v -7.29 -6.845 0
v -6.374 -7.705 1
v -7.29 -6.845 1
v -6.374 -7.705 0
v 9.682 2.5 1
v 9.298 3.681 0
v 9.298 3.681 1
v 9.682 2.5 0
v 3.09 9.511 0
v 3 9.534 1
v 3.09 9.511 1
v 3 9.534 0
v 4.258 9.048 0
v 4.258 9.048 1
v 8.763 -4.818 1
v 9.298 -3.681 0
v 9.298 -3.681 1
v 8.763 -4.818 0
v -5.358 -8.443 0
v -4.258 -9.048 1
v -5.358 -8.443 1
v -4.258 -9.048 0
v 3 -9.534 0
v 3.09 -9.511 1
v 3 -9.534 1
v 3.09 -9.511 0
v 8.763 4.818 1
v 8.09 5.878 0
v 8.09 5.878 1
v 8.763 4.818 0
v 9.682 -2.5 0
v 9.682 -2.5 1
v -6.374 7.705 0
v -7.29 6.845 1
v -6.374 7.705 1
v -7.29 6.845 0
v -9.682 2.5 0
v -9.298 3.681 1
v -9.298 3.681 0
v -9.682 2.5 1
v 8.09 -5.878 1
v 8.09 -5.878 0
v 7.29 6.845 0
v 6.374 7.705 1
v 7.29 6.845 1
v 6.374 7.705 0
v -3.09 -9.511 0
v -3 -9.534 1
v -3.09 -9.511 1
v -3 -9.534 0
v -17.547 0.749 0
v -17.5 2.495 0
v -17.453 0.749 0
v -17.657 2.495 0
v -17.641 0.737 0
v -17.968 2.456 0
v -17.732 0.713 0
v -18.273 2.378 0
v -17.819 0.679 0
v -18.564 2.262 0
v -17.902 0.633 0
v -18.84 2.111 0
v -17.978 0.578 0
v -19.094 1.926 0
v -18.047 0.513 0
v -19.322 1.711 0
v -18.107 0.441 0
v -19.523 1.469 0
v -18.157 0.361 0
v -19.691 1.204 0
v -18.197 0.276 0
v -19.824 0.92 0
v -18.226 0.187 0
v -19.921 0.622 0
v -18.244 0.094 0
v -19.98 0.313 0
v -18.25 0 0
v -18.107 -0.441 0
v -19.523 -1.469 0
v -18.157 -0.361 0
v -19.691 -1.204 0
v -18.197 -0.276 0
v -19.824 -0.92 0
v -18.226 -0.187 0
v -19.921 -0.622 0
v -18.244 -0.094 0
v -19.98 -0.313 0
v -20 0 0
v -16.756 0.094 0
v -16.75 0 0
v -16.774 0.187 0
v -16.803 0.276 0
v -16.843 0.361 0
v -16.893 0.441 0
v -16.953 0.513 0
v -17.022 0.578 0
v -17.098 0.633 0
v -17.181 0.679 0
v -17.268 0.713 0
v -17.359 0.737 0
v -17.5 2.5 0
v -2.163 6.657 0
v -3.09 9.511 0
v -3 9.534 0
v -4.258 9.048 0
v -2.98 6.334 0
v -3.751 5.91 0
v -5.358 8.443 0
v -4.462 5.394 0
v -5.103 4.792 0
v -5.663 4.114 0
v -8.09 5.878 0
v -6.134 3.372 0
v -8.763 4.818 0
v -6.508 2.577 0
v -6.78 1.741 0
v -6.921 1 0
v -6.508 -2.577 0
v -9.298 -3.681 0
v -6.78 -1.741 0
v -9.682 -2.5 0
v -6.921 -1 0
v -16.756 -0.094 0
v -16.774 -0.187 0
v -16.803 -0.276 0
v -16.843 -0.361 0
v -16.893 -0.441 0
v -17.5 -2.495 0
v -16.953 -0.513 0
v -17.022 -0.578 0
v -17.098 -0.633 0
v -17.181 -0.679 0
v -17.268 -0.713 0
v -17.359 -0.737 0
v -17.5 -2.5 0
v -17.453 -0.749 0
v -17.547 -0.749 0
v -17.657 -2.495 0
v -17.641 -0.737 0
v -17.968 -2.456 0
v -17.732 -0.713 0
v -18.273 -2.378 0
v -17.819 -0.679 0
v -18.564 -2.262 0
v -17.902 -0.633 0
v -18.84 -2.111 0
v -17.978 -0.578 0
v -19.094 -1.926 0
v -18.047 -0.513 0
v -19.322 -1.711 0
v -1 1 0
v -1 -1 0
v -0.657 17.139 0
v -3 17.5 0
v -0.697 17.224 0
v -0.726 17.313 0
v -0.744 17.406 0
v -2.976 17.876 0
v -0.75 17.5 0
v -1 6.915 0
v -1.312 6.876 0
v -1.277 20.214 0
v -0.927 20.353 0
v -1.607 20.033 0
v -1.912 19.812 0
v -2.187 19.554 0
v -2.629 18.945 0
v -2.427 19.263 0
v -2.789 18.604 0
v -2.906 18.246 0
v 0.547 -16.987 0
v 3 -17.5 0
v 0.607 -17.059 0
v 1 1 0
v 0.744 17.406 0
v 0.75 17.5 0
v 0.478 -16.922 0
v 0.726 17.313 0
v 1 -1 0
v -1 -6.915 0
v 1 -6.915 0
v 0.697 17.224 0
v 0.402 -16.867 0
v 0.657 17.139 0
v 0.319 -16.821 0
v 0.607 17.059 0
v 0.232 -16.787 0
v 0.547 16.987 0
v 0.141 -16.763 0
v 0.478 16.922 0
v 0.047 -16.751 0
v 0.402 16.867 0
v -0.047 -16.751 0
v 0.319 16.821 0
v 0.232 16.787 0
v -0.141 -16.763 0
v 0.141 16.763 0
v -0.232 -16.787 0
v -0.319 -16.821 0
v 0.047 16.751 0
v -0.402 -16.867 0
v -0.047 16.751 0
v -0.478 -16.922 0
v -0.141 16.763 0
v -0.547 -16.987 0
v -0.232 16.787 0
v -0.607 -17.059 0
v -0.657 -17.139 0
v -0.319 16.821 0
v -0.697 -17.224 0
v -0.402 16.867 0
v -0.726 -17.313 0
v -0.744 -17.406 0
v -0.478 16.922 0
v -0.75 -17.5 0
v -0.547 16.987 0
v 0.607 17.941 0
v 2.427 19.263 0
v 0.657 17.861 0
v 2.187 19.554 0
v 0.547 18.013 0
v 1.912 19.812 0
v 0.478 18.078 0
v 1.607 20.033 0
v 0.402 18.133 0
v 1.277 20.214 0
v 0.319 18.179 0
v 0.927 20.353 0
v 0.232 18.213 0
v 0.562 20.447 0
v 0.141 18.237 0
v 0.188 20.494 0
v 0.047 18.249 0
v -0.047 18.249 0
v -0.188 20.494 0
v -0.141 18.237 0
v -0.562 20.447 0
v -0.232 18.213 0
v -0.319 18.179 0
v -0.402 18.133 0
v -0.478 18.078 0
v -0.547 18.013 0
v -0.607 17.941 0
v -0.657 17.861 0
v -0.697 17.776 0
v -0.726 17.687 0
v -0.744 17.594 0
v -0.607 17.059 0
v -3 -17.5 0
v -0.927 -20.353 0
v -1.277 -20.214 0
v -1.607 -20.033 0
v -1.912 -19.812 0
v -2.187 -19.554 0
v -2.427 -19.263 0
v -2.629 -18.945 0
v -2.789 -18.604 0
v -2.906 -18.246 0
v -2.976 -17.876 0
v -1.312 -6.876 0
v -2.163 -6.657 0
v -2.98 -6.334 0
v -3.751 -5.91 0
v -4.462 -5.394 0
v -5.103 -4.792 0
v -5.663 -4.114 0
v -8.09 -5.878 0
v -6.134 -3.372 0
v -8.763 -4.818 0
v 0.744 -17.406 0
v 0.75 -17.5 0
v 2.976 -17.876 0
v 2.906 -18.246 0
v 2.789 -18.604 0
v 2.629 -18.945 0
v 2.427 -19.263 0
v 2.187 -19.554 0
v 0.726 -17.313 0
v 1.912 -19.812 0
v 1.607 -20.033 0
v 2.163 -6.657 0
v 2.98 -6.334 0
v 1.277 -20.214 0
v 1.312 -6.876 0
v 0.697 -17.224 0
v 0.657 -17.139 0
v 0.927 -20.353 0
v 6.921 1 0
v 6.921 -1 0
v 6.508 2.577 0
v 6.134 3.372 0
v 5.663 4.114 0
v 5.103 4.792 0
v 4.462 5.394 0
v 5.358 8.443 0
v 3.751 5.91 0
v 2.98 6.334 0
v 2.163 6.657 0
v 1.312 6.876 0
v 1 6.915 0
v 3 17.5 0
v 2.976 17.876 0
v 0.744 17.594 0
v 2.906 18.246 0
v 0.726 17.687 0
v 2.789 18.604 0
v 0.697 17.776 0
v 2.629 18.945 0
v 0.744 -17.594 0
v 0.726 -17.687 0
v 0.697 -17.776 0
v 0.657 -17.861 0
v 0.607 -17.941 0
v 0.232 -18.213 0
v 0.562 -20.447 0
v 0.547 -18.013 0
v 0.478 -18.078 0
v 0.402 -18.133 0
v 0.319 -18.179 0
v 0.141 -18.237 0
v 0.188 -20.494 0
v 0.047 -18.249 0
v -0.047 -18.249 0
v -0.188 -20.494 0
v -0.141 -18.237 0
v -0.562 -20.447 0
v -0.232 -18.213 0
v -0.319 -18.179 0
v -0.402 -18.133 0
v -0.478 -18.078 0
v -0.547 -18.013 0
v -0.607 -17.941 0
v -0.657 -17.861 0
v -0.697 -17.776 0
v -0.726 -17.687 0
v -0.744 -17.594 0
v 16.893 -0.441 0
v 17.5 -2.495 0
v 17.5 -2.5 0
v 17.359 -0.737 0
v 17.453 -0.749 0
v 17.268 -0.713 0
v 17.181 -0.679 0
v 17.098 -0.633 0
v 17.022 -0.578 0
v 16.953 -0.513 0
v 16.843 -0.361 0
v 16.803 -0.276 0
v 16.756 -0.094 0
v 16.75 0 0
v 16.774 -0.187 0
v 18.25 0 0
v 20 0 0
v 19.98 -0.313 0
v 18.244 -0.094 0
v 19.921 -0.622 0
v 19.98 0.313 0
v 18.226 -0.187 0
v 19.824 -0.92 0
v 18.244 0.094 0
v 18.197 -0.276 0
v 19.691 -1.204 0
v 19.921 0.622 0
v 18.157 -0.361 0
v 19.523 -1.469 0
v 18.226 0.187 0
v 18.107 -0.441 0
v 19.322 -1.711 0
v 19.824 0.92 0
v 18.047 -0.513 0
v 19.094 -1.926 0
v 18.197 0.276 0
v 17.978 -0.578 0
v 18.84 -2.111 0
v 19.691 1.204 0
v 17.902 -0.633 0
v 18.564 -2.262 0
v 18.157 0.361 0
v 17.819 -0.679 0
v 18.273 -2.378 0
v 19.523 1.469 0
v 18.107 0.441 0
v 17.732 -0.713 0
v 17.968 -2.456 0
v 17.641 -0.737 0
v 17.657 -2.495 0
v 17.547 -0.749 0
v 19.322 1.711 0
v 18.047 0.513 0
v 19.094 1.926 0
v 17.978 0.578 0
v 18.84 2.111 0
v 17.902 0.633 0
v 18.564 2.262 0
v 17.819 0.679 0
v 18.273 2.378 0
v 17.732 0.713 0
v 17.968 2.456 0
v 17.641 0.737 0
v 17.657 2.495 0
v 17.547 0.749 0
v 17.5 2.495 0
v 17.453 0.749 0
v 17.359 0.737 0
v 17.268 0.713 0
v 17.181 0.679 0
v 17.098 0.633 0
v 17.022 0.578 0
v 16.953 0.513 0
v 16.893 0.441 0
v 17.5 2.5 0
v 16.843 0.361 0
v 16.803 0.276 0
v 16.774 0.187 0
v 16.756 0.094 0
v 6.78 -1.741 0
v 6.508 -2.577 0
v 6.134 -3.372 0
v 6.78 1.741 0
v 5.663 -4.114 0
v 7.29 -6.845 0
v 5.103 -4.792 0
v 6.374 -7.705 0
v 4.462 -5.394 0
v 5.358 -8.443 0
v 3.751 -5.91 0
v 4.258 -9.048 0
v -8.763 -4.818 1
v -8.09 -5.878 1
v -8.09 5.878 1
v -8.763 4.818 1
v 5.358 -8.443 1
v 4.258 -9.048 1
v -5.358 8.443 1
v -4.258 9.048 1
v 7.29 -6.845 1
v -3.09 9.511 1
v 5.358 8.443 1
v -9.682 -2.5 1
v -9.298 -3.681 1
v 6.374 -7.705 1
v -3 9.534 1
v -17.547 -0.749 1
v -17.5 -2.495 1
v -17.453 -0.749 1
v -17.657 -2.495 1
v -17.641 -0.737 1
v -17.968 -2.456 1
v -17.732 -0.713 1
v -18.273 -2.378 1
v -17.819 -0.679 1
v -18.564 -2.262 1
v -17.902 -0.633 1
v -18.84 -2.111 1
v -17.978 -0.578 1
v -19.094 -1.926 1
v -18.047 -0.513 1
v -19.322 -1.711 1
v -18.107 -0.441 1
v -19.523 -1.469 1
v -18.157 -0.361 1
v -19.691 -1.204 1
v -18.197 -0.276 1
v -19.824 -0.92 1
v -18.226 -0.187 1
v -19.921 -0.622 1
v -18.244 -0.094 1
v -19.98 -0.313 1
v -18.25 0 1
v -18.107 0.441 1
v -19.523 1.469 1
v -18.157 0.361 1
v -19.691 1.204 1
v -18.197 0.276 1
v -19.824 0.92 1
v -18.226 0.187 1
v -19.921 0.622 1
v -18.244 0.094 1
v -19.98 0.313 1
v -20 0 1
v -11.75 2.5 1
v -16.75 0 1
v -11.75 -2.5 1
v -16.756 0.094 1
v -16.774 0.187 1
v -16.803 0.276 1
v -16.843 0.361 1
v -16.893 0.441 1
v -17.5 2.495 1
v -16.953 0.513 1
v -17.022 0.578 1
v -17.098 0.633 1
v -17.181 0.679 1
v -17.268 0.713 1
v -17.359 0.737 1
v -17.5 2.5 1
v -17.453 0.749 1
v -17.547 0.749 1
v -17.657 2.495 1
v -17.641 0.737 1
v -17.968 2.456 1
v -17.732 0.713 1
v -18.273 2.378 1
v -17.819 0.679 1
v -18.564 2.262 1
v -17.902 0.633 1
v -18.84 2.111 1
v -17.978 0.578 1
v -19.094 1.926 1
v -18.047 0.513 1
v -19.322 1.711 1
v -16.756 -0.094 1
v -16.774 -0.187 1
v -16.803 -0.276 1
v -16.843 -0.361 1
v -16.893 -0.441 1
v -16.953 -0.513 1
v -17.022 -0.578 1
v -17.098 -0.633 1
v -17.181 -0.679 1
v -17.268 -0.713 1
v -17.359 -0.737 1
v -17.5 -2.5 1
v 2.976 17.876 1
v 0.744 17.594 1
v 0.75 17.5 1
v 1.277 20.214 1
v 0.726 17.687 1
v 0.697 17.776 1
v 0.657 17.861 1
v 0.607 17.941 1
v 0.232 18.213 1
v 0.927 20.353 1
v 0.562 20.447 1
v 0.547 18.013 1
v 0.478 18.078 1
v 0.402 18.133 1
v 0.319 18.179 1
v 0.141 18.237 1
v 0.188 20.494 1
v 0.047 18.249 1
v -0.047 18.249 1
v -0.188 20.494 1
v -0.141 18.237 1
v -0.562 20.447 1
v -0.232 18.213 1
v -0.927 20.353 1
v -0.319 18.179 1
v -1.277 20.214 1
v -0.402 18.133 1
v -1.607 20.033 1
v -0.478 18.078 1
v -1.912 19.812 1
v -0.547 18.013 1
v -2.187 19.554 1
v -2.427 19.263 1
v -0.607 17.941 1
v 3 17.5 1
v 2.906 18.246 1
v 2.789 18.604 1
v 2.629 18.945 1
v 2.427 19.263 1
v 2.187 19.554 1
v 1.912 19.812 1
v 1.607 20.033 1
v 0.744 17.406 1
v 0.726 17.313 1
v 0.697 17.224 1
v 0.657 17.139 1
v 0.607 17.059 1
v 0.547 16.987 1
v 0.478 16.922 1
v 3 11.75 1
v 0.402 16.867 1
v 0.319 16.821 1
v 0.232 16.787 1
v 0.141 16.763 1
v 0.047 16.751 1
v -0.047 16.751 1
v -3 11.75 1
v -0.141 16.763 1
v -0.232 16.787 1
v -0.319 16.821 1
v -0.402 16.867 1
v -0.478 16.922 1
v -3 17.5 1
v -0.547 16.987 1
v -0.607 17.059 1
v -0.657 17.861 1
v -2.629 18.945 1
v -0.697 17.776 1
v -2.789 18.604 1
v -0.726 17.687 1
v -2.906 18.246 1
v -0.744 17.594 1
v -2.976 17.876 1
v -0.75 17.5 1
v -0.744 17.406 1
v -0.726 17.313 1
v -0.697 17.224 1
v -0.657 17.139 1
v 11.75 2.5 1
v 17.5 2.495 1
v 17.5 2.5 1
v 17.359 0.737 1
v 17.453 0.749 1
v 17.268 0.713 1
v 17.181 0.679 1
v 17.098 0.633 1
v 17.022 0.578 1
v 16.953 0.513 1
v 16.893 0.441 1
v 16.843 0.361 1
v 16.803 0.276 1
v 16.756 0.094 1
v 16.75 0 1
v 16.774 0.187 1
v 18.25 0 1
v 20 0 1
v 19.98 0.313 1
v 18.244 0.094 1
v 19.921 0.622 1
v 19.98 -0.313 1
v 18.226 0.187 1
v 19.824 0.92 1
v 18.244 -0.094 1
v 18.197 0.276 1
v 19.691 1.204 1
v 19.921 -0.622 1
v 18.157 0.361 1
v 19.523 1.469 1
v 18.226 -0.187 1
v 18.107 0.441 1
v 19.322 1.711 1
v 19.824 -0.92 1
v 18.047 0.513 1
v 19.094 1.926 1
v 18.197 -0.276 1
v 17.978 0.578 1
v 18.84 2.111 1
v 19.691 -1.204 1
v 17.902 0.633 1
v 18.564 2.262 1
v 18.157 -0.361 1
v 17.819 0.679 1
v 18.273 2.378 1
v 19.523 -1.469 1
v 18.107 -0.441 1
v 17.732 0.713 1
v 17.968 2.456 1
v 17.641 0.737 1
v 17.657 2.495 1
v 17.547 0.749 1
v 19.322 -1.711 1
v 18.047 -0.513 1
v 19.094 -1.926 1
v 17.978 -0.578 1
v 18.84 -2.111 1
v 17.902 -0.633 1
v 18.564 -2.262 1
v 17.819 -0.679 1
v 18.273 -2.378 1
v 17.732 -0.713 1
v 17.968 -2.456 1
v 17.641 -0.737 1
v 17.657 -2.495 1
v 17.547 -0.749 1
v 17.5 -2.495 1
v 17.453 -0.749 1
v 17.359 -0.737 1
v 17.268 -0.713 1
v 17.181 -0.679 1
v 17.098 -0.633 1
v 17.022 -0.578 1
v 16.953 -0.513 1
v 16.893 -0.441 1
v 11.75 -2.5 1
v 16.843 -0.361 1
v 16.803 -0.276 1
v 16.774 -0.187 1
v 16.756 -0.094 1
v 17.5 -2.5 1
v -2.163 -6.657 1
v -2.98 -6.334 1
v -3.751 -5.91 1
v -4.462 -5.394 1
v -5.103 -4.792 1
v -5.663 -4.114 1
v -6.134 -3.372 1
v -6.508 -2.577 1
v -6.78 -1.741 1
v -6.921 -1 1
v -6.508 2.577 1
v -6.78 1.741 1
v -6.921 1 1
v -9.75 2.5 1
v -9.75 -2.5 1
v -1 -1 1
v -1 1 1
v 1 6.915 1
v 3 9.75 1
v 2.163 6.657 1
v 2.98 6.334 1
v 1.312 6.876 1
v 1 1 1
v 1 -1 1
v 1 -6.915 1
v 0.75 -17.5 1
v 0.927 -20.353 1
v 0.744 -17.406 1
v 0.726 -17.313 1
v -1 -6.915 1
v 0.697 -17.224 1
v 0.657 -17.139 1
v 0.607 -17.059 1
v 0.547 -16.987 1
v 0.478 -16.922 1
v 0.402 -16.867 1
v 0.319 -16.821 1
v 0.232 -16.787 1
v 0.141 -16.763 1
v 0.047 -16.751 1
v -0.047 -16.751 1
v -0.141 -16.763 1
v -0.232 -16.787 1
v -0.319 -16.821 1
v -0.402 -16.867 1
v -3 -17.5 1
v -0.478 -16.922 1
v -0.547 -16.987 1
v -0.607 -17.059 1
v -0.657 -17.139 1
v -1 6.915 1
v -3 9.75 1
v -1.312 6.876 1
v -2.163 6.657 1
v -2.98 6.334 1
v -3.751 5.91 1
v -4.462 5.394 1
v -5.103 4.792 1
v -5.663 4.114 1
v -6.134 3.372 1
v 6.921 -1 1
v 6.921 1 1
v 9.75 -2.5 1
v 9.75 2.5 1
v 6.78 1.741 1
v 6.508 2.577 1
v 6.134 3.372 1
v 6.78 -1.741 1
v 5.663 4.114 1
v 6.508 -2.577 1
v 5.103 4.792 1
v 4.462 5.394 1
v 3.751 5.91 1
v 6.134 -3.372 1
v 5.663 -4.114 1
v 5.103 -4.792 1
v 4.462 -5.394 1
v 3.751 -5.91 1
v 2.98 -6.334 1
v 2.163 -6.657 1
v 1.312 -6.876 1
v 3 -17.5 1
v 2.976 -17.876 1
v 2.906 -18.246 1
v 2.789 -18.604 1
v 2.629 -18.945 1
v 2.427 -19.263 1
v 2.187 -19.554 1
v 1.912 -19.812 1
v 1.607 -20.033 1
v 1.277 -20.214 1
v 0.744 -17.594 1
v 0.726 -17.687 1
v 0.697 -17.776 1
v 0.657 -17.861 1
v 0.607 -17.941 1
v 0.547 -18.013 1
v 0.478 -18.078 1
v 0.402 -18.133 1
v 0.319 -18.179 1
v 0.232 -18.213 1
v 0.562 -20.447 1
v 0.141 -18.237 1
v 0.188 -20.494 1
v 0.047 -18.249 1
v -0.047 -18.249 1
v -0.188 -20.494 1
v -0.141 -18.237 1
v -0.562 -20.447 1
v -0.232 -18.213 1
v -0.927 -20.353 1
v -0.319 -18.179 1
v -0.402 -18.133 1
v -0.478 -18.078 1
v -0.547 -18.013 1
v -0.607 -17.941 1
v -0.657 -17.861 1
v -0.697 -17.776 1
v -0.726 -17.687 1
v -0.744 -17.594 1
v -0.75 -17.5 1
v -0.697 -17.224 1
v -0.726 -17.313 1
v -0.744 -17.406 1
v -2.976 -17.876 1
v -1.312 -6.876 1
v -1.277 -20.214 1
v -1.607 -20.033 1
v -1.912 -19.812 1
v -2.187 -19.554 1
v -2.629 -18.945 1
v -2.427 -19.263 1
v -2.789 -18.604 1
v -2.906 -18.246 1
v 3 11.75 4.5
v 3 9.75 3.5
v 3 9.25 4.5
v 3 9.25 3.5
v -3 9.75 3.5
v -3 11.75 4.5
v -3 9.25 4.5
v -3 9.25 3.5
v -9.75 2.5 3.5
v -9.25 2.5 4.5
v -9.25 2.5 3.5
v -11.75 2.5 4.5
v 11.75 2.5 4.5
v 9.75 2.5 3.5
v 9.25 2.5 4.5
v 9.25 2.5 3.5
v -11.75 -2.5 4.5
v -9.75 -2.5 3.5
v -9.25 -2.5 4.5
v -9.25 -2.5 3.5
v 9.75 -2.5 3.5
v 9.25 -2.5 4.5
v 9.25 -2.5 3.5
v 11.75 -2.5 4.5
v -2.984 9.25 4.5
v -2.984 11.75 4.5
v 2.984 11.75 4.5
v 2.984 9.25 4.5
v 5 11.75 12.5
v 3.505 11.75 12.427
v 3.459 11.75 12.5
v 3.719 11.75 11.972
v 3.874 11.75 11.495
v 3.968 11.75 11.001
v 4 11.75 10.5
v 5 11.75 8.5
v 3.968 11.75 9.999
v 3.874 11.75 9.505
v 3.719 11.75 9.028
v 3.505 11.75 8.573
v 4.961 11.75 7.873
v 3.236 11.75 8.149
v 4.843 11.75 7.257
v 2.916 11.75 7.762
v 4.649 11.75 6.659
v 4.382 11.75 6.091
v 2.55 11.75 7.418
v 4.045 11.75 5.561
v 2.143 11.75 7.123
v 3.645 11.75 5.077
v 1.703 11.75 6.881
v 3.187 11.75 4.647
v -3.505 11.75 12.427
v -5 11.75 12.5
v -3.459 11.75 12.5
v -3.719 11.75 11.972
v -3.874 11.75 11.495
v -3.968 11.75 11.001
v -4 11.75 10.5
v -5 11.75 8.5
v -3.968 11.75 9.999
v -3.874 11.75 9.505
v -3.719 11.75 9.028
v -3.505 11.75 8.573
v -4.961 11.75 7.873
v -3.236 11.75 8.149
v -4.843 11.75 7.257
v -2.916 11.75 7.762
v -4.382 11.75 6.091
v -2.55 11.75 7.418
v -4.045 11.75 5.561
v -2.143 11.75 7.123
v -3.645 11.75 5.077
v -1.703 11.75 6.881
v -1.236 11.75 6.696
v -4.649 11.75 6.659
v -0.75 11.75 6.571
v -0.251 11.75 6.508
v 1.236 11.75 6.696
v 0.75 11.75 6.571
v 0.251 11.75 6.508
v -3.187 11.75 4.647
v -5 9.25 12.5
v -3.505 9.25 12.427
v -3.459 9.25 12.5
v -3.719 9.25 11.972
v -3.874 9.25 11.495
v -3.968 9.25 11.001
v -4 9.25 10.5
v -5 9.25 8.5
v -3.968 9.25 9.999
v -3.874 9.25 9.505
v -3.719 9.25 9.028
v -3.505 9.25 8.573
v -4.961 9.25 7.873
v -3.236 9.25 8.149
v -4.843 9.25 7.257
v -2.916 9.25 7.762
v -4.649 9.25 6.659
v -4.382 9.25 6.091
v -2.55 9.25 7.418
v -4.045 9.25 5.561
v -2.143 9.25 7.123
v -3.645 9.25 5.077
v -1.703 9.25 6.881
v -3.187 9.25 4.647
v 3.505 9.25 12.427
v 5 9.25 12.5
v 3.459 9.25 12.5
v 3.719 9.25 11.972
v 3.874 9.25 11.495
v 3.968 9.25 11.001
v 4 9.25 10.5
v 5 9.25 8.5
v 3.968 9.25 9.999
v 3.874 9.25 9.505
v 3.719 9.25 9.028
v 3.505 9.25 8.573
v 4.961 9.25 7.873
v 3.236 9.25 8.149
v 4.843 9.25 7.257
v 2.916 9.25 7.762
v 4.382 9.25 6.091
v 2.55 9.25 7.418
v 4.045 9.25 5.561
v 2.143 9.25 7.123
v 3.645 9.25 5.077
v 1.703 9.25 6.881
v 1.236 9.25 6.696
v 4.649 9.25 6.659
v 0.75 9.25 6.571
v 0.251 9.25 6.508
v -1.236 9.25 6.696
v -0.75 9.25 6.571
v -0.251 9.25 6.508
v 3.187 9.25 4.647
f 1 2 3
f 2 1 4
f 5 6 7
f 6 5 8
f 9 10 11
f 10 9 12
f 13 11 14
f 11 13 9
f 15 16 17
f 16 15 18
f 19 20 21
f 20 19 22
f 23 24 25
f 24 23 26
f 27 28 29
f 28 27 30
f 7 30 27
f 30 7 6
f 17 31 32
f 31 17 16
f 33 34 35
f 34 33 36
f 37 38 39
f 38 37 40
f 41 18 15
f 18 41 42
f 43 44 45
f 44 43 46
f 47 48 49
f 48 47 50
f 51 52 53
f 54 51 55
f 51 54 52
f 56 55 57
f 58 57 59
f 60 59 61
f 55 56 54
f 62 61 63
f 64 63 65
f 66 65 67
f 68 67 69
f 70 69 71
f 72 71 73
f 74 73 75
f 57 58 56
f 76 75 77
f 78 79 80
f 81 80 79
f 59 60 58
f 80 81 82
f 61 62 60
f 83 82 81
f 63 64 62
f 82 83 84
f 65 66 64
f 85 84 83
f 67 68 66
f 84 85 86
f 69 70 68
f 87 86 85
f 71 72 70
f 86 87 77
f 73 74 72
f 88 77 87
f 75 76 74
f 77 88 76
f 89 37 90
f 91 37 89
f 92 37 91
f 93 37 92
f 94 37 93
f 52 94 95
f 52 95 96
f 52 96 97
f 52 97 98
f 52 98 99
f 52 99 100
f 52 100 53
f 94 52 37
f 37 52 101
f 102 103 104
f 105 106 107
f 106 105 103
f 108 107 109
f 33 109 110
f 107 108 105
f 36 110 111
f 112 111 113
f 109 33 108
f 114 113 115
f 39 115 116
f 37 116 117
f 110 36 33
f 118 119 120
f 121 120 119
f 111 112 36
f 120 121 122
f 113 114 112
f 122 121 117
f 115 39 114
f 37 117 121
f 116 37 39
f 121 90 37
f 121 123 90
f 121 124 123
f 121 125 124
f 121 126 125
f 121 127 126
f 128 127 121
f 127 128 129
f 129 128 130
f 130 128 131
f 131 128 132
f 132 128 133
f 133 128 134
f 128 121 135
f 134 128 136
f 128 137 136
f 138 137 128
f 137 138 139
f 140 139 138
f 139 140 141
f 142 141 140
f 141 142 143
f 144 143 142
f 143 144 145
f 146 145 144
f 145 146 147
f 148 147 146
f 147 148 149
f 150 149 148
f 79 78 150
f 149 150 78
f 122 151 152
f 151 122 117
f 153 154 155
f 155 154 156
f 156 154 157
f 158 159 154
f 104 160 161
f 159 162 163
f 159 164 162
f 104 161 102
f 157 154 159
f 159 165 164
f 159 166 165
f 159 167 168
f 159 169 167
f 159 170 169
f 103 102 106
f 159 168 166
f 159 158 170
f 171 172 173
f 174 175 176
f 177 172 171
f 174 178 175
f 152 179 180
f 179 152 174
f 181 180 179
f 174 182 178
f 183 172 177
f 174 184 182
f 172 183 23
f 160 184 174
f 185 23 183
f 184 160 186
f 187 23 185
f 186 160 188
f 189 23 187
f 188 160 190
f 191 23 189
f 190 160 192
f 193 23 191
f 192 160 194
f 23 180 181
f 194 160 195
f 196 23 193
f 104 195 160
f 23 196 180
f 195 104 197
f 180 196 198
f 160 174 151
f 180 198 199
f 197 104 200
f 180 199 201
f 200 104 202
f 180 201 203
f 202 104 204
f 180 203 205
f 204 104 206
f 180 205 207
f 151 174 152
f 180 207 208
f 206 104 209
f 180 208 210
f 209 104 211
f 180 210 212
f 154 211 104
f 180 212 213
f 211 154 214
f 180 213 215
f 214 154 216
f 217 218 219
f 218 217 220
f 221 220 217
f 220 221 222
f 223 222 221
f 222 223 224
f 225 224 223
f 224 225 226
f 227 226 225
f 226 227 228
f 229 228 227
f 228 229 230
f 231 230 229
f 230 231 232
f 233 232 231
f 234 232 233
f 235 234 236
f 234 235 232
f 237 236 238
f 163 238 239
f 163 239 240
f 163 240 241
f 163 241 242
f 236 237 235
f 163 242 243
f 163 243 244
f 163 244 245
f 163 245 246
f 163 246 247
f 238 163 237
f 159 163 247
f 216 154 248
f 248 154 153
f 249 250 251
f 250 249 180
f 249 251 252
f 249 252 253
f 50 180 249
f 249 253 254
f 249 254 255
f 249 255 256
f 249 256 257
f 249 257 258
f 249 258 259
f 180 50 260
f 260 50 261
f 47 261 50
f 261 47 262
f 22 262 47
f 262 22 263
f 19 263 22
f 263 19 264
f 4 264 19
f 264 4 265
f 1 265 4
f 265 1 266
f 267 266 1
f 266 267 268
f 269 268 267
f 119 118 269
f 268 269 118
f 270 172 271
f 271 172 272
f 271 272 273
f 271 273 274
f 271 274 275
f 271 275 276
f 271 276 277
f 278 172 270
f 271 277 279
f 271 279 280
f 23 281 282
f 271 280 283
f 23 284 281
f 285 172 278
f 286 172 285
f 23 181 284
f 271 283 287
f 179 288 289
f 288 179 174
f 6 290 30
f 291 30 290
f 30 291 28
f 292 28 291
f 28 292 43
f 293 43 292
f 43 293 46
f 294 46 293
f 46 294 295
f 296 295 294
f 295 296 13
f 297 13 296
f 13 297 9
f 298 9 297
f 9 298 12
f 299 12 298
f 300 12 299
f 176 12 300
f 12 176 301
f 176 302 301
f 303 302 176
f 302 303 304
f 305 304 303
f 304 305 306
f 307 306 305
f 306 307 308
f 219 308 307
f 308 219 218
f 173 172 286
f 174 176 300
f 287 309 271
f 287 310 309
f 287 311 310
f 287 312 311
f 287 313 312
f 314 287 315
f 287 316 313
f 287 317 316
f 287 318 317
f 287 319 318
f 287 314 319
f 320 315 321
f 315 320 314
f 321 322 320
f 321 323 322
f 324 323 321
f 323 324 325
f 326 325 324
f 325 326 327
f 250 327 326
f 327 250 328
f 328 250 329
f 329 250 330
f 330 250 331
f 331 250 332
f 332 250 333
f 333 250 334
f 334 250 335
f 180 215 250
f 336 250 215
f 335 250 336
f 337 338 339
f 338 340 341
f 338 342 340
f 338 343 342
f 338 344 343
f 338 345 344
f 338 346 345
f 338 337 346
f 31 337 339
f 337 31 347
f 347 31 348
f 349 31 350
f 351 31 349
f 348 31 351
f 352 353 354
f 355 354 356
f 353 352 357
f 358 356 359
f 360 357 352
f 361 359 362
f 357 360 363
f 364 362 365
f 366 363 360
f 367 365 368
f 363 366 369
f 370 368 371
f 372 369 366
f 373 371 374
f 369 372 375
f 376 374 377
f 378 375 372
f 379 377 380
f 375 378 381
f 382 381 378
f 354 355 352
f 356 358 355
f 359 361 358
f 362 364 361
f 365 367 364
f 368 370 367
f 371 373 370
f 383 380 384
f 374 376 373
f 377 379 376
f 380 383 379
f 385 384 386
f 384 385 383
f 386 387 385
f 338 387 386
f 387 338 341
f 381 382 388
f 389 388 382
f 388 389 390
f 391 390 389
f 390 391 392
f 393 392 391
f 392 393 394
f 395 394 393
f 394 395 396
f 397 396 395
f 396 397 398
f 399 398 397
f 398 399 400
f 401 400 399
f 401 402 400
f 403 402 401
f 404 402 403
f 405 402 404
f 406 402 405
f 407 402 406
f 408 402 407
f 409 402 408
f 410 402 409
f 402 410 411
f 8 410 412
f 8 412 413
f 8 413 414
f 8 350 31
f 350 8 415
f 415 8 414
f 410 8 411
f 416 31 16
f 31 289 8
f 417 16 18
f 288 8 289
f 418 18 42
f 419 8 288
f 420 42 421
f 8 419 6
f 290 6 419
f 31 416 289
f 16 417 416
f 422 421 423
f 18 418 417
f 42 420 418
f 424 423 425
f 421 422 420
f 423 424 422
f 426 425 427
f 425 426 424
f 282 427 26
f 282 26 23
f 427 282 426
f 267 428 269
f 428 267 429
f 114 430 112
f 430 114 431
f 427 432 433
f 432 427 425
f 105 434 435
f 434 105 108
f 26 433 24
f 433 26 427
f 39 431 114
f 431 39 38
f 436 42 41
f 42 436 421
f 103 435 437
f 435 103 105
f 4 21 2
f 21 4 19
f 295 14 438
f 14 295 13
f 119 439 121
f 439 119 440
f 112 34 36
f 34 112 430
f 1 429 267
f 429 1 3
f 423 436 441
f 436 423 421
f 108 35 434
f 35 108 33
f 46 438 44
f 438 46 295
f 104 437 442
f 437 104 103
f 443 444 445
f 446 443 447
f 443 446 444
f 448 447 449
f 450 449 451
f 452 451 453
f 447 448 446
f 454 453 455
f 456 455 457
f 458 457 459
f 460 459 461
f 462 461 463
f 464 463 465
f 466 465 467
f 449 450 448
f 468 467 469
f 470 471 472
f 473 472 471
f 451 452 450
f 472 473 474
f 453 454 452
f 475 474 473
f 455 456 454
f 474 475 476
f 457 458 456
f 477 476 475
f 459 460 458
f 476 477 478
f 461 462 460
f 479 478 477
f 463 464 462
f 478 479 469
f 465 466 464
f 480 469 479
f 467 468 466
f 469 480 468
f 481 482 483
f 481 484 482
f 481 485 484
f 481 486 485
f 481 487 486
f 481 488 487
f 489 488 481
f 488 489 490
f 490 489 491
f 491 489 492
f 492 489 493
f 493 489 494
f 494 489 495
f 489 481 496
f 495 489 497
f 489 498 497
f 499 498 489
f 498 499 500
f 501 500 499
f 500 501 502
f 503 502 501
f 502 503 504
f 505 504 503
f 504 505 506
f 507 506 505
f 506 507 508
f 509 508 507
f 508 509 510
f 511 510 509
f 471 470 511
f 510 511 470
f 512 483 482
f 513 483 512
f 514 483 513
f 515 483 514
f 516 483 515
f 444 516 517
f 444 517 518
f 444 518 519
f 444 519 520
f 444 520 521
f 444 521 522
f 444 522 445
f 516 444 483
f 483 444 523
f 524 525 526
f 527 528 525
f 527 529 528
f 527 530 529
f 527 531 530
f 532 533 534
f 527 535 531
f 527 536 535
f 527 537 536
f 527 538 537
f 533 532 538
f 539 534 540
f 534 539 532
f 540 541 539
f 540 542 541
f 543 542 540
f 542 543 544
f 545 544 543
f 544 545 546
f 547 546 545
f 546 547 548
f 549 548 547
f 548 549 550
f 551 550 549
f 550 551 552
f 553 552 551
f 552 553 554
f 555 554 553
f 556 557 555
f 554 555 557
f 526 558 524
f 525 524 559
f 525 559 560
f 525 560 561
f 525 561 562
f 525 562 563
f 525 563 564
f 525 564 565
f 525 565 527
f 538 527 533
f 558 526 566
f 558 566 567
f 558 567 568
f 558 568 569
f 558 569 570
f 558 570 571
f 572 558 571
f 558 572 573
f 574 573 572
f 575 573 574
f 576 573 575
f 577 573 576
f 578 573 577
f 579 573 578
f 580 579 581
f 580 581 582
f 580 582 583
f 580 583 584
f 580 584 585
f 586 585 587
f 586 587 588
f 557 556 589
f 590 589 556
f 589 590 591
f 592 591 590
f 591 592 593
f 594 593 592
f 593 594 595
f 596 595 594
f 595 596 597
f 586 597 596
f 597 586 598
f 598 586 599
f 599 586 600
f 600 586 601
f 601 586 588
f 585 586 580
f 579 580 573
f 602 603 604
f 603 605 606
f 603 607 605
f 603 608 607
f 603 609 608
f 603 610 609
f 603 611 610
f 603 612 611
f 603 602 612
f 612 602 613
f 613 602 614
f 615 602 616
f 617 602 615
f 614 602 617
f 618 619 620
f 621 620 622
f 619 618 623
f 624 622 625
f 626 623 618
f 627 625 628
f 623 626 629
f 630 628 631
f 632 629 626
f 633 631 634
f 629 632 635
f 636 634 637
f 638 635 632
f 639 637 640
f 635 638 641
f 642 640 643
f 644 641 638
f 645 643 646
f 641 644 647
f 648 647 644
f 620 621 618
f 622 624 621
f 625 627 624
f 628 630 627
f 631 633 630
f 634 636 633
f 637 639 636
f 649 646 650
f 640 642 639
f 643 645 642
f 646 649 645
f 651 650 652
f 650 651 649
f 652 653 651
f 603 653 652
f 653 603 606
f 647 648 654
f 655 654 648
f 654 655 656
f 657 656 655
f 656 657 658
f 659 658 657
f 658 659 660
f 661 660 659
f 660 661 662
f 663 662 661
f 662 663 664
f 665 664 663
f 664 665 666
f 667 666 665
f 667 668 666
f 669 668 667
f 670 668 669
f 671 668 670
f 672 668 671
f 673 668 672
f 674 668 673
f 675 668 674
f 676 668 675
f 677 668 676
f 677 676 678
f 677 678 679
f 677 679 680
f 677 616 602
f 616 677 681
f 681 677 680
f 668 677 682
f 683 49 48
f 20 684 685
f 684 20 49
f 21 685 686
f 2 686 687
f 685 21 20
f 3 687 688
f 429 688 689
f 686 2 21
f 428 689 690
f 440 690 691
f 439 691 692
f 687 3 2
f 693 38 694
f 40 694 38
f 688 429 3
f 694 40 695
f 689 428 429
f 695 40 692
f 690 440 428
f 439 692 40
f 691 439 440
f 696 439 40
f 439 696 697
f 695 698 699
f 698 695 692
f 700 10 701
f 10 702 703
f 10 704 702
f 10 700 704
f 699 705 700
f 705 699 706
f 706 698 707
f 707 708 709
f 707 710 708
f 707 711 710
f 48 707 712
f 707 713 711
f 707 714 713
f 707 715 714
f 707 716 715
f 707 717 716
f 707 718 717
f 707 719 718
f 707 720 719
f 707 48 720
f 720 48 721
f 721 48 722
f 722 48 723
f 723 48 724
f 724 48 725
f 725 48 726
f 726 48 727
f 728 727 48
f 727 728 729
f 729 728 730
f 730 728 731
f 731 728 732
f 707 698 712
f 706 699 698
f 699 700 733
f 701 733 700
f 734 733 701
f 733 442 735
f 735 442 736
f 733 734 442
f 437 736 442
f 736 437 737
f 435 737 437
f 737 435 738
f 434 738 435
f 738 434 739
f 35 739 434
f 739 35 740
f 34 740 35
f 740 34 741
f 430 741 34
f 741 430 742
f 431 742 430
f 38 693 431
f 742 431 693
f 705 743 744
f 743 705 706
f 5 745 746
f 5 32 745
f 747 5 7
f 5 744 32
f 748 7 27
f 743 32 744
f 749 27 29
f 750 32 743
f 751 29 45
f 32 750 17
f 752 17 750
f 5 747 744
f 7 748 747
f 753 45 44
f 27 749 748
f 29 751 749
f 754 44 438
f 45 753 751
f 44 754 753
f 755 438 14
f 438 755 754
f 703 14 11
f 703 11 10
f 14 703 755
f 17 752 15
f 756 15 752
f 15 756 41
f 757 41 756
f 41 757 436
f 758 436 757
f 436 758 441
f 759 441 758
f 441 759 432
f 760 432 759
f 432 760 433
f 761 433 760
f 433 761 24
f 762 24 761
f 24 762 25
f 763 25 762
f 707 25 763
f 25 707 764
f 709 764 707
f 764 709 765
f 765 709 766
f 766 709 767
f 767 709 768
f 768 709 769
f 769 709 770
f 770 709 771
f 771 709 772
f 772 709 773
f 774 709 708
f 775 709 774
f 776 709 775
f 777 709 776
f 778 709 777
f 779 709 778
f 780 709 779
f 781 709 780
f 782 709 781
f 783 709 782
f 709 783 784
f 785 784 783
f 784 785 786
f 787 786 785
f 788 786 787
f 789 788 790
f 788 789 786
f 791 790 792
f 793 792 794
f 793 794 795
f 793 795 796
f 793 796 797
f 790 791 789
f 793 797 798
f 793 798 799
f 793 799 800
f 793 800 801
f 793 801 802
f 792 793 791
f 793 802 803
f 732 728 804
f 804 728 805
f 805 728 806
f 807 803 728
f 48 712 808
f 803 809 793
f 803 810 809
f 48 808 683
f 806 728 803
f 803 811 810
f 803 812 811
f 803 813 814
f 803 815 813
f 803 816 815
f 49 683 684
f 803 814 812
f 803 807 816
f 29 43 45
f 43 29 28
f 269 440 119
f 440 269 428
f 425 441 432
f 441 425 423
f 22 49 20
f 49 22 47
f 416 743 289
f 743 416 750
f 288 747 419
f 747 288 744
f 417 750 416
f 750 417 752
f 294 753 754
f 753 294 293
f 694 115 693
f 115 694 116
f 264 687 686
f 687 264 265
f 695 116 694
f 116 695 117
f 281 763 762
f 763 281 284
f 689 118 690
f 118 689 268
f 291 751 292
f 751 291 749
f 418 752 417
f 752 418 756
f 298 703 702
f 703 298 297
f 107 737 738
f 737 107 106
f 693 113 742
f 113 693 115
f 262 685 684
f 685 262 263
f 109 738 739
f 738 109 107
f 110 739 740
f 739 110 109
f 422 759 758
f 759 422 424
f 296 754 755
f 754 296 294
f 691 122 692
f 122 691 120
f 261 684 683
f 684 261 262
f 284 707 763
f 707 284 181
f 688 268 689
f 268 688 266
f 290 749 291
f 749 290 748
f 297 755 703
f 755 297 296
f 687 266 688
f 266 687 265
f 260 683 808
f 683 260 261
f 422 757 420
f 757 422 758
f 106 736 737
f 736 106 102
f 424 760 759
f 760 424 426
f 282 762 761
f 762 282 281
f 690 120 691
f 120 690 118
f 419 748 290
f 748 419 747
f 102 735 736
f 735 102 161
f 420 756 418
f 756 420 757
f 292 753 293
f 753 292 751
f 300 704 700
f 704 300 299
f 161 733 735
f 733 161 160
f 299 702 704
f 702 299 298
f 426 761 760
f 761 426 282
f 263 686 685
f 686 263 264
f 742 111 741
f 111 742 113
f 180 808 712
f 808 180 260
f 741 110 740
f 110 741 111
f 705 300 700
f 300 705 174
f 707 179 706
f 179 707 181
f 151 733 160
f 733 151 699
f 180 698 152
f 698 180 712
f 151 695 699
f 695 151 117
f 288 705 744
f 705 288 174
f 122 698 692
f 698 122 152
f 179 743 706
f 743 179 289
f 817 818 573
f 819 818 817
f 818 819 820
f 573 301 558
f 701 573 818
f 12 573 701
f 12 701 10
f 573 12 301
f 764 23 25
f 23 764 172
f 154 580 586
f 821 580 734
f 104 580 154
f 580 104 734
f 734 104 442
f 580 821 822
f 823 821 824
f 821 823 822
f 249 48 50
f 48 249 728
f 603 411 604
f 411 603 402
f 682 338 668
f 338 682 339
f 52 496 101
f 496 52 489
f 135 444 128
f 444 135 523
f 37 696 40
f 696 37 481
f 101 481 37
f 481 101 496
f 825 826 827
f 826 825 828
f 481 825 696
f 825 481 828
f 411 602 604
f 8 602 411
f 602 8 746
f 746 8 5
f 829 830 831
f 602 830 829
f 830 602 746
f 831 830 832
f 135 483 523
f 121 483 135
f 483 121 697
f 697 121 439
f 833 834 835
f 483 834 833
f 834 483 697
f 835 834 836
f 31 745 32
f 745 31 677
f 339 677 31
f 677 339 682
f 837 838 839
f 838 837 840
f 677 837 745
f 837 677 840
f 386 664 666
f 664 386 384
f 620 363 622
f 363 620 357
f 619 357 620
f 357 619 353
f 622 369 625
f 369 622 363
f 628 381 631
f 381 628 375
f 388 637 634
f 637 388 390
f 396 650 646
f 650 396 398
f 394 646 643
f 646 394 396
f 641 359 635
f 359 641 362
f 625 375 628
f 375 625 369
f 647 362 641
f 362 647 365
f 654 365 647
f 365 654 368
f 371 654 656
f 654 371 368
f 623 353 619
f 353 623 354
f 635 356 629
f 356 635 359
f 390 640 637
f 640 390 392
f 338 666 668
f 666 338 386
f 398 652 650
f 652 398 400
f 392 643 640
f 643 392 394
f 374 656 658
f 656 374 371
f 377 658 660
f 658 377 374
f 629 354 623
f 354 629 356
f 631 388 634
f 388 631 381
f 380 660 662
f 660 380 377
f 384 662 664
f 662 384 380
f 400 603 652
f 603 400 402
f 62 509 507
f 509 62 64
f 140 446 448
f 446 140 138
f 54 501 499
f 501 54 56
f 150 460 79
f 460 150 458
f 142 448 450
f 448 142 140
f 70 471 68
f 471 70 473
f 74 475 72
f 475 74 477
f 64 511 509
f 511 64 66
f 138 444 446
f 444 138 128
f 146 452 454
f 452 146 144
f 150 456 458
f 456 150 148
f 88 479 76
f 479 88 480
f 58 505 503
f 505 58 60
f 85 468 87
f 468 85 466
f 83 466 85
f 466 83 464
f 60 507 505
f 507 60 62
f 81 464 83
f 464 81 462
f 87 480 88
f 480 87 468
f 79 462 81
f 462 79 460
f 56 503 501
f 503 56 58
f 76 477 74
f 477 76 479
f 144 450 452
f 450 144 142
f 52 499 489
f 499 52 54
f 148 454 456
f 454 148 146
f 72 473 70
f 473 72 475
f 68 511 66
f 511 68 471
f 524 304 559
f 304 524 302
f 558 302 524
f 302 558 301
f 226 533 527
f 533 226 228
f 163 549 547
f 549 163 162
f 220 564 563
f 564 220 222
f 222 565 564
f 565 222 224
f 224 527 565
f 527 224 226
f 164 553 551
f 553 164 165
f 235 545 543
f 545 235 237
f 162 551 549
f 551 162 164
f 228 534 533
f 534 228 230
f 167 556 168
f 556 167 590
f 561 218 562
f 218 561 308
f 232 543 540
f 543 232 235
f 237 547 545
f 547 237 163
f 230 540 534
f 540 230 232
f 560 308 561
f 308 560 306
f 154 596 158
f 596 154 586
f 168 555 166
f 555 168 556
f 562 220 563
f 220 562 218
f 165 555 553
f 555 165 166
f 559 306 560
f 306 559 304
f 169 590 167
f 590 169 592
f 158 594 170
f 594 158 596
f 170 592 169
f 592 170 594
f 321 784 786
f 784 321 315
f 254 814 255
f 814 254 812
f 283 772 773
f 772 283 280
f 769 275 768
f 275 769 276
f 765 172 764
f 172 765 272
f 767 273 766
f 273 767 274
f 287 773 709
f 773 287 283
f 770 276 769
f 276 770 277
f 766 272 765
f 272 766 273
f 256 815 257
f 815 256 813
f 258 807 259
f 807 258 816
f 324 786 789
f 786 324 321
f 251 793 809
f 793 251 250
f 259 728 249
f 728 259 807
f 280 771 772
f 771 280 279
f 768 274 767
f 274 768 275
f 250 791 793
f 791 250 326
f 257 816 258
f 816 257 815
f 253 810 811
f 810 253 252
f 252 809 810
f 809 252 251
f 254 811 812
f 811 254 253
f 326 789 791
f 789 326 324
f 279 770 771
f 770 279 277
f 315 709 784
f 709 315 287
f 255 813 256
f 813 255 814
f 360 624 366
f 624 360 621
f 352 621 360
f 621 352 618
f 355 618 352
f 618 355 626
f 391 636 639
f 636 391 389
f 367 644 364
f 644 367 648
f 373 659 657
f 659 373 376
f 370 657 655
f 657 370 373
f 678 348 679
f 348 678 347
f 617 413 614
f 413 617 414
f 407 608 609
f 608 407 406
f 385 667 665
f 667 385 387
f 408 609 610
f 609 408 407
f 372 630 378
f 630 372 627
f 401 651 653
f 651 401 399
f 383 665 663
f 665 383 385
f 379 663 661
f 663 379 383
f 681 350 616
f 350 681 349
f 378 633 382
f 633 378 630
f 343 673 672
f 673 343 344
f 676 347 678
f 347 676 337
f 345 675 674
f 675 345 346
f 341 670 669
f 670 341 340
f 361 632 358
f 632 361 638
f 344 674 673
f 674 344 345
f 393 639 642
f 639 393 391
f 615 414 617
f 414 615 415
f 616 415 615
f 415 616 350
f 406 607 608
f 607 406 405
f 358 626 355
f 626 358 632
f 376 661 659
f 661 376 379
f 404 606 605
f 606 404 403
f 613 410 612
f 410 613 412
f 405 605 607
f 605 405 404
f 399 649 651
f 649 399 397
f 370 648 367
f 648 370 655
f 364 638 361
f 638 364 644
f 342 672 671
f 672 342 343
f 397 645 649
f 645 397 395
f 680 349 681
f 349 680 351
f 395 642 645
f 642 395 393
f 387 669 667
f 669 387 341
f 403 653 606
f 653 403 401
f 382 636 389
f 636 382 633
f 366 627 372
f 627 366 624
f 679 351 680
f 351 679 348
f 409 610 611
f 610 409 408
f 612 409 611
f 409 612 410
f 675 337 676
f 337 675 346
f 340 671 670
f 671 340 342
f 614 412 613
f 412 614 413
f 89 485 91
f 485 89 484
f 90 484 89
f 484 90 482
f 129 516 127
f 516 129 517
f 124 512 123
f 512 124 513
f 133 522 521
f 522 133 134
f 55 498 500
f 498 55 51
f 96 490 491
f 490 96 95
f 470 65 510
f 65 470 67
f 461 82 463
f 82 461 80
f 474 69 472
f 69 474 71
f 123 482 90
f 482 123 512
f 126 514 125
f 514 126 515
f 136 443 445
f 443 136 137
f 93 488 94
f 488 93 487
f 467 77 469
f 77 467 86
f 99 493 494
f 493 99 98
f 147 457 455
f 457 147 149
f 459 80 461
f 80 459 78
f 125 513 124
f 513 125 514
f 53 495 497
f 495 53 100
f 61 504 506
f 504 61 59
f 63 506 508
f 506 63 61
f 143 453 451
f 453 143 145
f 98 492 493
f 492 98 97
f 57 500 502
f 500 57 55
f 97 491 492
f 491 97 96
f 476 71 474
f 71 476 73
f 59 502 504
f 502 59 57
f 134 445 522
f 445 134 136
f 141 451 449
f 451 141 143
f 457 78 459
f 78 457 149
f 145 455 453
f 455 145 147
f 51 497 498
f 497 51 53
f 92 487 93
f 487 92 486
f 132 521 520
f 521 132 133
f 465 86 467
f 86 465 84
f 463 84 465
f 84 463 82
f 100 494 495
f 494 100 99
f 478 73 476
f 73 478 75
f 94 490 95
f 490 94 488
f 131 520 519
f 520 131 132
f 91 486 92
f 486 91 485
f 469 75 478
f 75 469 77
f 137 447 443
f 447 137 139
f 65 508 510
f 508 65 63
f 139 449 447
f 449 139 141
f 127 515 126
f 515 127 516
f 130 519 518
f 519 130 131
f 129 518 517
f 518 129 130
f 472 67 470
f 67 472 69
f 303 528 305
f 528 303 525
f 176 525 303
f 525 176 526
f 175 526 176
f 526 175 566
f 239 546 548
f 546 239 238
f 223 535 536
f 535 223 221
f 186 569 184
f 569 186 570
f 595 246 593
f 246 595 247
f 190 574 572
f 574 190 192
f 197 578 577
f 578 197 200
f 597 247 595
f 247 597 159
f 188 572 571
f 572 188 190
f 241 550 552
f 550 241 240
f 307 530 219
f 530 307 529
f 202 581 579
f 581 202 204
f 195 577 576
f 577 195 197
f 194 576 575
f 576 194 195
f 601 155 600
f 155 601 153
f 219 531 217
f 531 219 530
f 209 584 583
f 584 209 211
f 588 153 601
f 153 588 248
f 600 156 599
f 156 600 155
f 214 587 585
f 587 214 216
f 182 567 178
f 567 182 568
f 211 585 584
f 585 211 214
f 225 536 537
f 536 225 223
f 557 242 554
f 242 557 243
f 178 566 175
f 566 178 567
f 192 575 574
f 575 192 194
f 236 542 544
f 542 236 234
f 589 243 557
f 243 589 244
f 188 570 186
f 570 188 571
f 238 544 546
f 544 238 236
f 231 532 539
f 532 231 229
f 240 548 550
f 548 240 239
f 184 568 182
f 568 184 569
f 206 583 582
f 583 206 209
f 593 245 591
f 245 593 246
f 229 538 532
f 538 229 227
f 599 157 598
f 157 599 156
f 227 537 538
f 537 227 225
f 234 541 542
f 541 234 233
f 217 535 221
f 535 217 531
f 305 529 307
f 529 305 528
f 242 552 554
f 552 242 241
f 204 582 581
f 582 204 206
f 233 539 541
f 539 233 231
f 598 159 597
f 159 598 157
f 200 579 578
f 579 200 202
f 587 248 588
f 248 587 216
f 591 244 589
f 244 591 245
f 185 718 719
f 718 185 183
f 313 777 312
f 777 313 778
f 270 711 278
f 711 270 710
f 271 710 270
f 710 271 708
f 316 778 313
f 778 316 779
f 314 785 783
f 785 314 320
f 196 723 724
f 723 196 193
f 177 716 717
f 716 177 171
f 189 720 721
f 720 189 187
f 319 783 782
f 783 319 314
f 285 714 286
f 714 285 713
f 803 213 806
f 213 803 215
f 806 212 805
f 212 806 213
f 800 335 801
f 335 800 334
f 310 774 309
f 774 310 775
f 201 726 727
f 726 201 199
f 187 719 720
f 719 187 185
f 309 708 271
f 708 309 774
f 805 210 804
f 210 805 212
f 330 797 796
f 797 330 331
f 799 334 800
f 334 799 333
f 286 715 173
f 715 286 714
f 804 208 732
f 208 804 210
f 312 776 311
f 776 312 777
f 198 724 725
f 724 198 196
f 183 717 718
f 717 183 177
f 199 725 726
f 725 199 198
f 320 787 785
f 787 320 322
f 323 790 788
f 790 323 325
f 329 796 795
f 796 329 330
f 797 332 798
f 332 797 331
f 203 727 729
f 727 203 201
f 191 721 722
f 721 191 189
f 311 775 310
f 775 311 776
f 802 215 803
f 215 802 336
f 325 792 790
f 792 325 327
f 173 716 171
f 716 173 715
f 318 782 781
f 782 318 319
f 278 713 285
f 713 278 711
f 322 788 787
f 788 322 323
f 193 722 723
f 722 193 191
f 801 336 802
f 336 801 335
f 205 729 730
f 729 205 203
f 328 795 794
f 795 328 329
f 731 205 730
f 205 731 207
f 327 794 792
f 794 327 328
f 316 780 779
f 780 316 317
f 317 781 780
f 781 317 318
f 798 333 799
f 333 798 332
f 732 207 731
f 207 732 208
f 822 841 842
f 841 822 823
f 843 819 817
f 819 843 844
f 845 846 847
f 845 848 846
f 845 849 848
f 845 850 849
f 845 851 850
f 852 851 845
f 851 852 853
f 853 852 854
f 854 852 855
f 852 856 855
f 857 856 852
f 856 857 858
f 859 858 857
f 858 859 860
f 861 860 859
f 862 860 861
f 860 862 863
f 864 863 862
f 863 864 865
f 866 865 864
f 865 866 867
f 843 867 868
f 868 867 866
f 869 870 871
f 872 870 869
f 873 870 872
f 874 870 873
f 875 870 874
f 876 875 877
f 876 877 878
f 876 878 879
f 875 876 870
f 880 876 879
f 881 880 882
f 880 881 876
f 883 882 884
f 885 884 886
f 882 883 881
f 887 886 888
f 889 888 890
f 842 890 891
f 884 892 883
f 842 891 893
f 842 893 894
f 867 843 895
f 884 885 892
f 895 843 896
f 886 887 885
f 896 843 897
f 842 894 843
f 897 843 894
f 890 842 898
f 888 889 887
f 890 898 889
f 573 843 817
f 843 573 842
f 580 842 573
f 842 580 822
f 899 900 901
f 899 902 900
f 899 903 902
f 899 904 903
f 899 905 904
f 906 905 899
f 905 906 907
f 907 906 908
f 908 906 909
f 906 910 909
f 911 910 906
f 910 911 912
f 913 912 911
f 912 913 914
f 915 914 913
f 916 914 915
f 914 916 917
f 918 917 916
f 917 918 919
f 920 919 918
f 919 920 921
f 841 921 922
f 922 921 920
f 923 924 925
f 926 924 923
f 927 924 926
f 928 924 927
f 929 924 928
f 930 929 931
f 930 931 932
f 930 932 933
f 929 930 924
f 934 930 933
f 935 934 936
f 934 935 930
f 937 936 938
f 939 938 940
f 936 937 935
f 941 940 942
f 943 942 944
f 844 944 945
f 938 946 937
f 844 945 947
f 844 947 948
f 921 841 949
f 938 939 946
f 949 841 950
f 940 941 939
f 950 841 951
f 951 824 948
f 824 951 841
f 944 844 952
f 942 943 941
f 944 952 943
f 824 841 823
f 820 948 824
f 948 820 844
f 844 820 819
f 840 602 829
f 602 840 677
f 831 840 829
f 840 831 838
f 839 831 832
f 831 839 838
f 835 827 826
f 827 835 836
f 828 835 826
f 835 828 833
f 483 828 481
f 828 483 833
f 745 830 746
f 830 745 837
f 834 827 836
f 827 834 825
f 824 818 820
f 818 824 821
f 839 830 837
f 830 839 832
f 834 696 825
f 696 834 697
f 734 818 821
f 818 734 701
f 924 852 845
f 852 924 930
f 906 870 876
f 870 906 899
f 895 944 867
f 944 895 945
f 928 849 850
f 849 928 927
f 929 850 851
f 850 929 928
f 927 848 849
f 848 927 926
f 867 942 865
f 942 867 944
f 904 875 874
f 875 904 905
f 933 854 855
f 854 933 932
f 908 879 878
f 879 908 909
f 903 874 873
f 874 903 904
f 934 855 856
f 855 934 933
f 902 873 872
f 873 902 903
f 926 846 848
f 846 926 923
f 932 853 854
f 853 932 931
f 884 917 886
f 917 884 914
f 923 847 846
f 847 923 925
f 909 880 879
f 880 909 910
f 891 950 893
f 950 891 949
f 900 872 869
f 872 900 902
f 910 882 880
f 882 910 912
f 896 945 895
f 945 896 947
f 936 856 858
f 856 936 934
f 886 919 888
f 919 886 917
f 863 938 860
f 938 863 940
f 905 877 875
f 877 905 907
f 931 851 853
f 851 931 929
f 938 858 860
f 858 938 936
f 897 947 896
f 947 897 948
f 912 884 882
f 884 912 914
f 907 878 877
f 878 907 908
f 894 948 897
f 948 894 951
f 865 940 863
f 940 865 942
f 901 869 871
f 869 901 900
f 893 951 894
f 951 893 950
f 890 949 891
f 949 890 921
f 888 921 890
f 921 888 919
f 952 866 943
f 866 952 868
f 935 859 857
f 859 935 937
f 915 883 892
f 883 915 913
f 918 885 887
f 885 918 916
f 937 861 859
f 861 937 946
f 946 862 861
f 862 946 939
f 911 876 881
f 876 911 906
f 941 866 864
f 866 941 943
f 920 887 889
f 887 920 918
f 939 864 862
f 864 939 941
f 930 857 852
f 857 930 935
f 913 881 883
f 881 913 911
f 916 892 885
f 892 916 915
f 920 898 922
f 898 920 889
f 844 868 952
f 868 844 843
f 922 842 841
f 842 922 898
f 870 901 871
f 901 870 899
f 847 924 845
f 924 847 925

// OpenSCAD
//Eachine Tiny 32bits F3 Brushed Whoop Mount with Camera Holder
height=1;
center_circle_width=20;

mmount_x=35;
mmount_y=35;

hole_factor=0.7;
bar_width_inner=2;
bar_width_outer_x=5;
bar_width_outer_y=6;

mount_hole_d=1.5;

fc_x = 19.5;
fc_y = 19.5;
fc_z = 2.5;

fc_mount_w=2;                   //Strength of the fc holder sidebars
fc_mount_top=1;                 //How much to add from the fc height to the sideclamps

$fn=50;

option_fc_mount=true;
option_fc_mount_cut=0.5;        //Add some clamp holders to the top of the fc sidebars

option_cam_mount=true;
option_show_template=false;

module mount() {
    //Main body
    translate([0,0,height*0.5])
        intersection() {
            union() {
                
                //Circle platform area
                difference() {
                    cylinder(d=center_circle_width,h=height,center=true);
                    cylinder(d=center_circle_width*hole_factor,h=height+0.1,center=true);
                }

                //Center beams
                cube([bar_width_inner,mmount_y,height],center=true);
                cube([center_circle_width,bar_width_inner,height],center=true);
                
            }
            
            cylinder(d=center_circle_width,h=height,center=true);
        }


    //Extended Crossarm
    translate([0,0,height*0.5])
        difference() {
               union() {
                    cube([bar_width_outer_y,mmount_y,height],center=true);
                    cube([mmount_x,bar_width_outer_x,height],center=true);
                   
                   //Rounded endparts
                   translate([mmount_x*0.5,0,0])
                        cylinder(d=bar_width_outer_x,h=height,center=true);
                   
                   translate([-mmount_x*0.5,0,0])
                        cylinder(d=bar_width_outer_x,h=height,center=true);
                   
                   translate([0,mmount_y*0.5,0])
                        cylinder(d=bar_width_outer_y,h=height,center=true);
                   
                   translate([0,-mmount_y*0.5,0])
                        cylinder(d=bar_width_outer_y,h=height,center=true);
               }
           
           //Center cutout
           cylinder(d=center_circle_width*hole_factor,h=height+0.1,center=true);
           
           //Mounting holes on arms
            translate([mmount_x*0.5,0,0])
                cylinder(d=mount_hole_d,h=height+1,center=true);
           
            translate([-mmount_x*0.5,0,0])
                cylinder(d=mount_hole_d,h=height+1,center=true);
           
            translate([0,mmount_y*0.5,0])
                cylinder(d=mount_hole_d,h=height+1,center=true);
           
            translate([0,-mmount_y*0.5,0])
                cylinder(d=mount_hole_d,h=height+1,center=true);
        }

    //FC Mounts

    //fc mount thingies
    if(option_fc_mount) {    
        difference() {
            translate([0,0,(fc_z+height*2+fc_mount_top)*0.5])
            union() {            
                //Front
                translate([0,fc_y*0.5+(fc_mount_w-option_fc_mount_cut)*0.5,0])
                    cube([bar_width_outer_y,fc_mount_w+option_fc_mount_cut,fc_z+fc_mount_top],center=true);
                
                //Back
                //translate([0,-fc_y*0.5-(fc_mount_w-option_fc_mount_cut)*0.5,(fc_z+height+fc_mount_top)*0.5])
                //    cube([bar_width_outer_y,fc_mount_w+option_fc_mount_cut,fc_z],center=true);
                
                //Right
                translate([fc_x*0.5+(fc_mount_w-option_fc_mount_cut)*0.5,0,0])
                    cube([fc_mount_w+option_fc_mount_cut,bar_width_outer_x,fc_z+fc_mount_top],center=true);
                
                //Left
                translate([-fc_x*0.5-(fc_mount_w-option_fc_mount_cut)*0.5,0,0])
                    cube([fc_mount_w+option_fc_mount_cut,bar_width_outer_x,fc_z+fc_mount_top],center=true);
        
            }
            //Holding ridge
            translate([0,0,(height*2+fc_z)*0.5])
                cube([fc_x,fc_y,fc_z],center=true);
            
        }
    }


    //Camera Mount

    if(option_cam_mount) {
        //fc_z+fc_mount_top
        cam_width= 8;
        cam_mount_width=10;
        cam_mount_thickness=fc_mount_w+option_fc_mount_cut;   //2
        cam_angle=10;
        cam_z=cam_mount_width;
        cam_mount_z_gap=0;
        cam_z_to_lense=3;
        cam_mount_slot_w=2.5;
        
        translate([0,0,(fc_z+height+fc_mount_top)])
        intersection() {
            difference() {
                    //Cam mount base
                    union() {            
                        translate([0,fc_y*0.5+(fc_mount_w-option_fc_mount_cut)*0.5,(cam_z+cam_z_to_lense-fc_mount_top)*0.5])
                            cube([cam_mount_width,cam_mount_thickness,cam_z+(cam_z_to_lense-fc_mount_top)],center=true);    
                    }
                
                    //Cam cut out
                    translate([0,fc_y*0.5+(fc_mount_w-option_fc_mount_cut)*0.5,cam_width*0.5+(cam_z_to_lense-fc_mount_top)+cam_mount_z_gap])
                        rotate([90,0,0])
                            cylinder(d=cam_width,h=cam_width,center=true);
                    
            }
        
        //Cam cut out
        translate([0,fc_y*0.5+(fc_mount_w-option_fc_mount_cut)*0.5,cam_width*0.5+cam_mount_z_gap])
            union() {
                rotate([90,0,0])
                    cylinder(d=cam_width+2,h=cam_width,center=true);
                //Cut top half
                translate([0,0,2])   //cam_width*0.5
                        cube([cam_width+2,cam_width,cam_width*0.5],center=true);
            }
        }
    }
}

mount();
